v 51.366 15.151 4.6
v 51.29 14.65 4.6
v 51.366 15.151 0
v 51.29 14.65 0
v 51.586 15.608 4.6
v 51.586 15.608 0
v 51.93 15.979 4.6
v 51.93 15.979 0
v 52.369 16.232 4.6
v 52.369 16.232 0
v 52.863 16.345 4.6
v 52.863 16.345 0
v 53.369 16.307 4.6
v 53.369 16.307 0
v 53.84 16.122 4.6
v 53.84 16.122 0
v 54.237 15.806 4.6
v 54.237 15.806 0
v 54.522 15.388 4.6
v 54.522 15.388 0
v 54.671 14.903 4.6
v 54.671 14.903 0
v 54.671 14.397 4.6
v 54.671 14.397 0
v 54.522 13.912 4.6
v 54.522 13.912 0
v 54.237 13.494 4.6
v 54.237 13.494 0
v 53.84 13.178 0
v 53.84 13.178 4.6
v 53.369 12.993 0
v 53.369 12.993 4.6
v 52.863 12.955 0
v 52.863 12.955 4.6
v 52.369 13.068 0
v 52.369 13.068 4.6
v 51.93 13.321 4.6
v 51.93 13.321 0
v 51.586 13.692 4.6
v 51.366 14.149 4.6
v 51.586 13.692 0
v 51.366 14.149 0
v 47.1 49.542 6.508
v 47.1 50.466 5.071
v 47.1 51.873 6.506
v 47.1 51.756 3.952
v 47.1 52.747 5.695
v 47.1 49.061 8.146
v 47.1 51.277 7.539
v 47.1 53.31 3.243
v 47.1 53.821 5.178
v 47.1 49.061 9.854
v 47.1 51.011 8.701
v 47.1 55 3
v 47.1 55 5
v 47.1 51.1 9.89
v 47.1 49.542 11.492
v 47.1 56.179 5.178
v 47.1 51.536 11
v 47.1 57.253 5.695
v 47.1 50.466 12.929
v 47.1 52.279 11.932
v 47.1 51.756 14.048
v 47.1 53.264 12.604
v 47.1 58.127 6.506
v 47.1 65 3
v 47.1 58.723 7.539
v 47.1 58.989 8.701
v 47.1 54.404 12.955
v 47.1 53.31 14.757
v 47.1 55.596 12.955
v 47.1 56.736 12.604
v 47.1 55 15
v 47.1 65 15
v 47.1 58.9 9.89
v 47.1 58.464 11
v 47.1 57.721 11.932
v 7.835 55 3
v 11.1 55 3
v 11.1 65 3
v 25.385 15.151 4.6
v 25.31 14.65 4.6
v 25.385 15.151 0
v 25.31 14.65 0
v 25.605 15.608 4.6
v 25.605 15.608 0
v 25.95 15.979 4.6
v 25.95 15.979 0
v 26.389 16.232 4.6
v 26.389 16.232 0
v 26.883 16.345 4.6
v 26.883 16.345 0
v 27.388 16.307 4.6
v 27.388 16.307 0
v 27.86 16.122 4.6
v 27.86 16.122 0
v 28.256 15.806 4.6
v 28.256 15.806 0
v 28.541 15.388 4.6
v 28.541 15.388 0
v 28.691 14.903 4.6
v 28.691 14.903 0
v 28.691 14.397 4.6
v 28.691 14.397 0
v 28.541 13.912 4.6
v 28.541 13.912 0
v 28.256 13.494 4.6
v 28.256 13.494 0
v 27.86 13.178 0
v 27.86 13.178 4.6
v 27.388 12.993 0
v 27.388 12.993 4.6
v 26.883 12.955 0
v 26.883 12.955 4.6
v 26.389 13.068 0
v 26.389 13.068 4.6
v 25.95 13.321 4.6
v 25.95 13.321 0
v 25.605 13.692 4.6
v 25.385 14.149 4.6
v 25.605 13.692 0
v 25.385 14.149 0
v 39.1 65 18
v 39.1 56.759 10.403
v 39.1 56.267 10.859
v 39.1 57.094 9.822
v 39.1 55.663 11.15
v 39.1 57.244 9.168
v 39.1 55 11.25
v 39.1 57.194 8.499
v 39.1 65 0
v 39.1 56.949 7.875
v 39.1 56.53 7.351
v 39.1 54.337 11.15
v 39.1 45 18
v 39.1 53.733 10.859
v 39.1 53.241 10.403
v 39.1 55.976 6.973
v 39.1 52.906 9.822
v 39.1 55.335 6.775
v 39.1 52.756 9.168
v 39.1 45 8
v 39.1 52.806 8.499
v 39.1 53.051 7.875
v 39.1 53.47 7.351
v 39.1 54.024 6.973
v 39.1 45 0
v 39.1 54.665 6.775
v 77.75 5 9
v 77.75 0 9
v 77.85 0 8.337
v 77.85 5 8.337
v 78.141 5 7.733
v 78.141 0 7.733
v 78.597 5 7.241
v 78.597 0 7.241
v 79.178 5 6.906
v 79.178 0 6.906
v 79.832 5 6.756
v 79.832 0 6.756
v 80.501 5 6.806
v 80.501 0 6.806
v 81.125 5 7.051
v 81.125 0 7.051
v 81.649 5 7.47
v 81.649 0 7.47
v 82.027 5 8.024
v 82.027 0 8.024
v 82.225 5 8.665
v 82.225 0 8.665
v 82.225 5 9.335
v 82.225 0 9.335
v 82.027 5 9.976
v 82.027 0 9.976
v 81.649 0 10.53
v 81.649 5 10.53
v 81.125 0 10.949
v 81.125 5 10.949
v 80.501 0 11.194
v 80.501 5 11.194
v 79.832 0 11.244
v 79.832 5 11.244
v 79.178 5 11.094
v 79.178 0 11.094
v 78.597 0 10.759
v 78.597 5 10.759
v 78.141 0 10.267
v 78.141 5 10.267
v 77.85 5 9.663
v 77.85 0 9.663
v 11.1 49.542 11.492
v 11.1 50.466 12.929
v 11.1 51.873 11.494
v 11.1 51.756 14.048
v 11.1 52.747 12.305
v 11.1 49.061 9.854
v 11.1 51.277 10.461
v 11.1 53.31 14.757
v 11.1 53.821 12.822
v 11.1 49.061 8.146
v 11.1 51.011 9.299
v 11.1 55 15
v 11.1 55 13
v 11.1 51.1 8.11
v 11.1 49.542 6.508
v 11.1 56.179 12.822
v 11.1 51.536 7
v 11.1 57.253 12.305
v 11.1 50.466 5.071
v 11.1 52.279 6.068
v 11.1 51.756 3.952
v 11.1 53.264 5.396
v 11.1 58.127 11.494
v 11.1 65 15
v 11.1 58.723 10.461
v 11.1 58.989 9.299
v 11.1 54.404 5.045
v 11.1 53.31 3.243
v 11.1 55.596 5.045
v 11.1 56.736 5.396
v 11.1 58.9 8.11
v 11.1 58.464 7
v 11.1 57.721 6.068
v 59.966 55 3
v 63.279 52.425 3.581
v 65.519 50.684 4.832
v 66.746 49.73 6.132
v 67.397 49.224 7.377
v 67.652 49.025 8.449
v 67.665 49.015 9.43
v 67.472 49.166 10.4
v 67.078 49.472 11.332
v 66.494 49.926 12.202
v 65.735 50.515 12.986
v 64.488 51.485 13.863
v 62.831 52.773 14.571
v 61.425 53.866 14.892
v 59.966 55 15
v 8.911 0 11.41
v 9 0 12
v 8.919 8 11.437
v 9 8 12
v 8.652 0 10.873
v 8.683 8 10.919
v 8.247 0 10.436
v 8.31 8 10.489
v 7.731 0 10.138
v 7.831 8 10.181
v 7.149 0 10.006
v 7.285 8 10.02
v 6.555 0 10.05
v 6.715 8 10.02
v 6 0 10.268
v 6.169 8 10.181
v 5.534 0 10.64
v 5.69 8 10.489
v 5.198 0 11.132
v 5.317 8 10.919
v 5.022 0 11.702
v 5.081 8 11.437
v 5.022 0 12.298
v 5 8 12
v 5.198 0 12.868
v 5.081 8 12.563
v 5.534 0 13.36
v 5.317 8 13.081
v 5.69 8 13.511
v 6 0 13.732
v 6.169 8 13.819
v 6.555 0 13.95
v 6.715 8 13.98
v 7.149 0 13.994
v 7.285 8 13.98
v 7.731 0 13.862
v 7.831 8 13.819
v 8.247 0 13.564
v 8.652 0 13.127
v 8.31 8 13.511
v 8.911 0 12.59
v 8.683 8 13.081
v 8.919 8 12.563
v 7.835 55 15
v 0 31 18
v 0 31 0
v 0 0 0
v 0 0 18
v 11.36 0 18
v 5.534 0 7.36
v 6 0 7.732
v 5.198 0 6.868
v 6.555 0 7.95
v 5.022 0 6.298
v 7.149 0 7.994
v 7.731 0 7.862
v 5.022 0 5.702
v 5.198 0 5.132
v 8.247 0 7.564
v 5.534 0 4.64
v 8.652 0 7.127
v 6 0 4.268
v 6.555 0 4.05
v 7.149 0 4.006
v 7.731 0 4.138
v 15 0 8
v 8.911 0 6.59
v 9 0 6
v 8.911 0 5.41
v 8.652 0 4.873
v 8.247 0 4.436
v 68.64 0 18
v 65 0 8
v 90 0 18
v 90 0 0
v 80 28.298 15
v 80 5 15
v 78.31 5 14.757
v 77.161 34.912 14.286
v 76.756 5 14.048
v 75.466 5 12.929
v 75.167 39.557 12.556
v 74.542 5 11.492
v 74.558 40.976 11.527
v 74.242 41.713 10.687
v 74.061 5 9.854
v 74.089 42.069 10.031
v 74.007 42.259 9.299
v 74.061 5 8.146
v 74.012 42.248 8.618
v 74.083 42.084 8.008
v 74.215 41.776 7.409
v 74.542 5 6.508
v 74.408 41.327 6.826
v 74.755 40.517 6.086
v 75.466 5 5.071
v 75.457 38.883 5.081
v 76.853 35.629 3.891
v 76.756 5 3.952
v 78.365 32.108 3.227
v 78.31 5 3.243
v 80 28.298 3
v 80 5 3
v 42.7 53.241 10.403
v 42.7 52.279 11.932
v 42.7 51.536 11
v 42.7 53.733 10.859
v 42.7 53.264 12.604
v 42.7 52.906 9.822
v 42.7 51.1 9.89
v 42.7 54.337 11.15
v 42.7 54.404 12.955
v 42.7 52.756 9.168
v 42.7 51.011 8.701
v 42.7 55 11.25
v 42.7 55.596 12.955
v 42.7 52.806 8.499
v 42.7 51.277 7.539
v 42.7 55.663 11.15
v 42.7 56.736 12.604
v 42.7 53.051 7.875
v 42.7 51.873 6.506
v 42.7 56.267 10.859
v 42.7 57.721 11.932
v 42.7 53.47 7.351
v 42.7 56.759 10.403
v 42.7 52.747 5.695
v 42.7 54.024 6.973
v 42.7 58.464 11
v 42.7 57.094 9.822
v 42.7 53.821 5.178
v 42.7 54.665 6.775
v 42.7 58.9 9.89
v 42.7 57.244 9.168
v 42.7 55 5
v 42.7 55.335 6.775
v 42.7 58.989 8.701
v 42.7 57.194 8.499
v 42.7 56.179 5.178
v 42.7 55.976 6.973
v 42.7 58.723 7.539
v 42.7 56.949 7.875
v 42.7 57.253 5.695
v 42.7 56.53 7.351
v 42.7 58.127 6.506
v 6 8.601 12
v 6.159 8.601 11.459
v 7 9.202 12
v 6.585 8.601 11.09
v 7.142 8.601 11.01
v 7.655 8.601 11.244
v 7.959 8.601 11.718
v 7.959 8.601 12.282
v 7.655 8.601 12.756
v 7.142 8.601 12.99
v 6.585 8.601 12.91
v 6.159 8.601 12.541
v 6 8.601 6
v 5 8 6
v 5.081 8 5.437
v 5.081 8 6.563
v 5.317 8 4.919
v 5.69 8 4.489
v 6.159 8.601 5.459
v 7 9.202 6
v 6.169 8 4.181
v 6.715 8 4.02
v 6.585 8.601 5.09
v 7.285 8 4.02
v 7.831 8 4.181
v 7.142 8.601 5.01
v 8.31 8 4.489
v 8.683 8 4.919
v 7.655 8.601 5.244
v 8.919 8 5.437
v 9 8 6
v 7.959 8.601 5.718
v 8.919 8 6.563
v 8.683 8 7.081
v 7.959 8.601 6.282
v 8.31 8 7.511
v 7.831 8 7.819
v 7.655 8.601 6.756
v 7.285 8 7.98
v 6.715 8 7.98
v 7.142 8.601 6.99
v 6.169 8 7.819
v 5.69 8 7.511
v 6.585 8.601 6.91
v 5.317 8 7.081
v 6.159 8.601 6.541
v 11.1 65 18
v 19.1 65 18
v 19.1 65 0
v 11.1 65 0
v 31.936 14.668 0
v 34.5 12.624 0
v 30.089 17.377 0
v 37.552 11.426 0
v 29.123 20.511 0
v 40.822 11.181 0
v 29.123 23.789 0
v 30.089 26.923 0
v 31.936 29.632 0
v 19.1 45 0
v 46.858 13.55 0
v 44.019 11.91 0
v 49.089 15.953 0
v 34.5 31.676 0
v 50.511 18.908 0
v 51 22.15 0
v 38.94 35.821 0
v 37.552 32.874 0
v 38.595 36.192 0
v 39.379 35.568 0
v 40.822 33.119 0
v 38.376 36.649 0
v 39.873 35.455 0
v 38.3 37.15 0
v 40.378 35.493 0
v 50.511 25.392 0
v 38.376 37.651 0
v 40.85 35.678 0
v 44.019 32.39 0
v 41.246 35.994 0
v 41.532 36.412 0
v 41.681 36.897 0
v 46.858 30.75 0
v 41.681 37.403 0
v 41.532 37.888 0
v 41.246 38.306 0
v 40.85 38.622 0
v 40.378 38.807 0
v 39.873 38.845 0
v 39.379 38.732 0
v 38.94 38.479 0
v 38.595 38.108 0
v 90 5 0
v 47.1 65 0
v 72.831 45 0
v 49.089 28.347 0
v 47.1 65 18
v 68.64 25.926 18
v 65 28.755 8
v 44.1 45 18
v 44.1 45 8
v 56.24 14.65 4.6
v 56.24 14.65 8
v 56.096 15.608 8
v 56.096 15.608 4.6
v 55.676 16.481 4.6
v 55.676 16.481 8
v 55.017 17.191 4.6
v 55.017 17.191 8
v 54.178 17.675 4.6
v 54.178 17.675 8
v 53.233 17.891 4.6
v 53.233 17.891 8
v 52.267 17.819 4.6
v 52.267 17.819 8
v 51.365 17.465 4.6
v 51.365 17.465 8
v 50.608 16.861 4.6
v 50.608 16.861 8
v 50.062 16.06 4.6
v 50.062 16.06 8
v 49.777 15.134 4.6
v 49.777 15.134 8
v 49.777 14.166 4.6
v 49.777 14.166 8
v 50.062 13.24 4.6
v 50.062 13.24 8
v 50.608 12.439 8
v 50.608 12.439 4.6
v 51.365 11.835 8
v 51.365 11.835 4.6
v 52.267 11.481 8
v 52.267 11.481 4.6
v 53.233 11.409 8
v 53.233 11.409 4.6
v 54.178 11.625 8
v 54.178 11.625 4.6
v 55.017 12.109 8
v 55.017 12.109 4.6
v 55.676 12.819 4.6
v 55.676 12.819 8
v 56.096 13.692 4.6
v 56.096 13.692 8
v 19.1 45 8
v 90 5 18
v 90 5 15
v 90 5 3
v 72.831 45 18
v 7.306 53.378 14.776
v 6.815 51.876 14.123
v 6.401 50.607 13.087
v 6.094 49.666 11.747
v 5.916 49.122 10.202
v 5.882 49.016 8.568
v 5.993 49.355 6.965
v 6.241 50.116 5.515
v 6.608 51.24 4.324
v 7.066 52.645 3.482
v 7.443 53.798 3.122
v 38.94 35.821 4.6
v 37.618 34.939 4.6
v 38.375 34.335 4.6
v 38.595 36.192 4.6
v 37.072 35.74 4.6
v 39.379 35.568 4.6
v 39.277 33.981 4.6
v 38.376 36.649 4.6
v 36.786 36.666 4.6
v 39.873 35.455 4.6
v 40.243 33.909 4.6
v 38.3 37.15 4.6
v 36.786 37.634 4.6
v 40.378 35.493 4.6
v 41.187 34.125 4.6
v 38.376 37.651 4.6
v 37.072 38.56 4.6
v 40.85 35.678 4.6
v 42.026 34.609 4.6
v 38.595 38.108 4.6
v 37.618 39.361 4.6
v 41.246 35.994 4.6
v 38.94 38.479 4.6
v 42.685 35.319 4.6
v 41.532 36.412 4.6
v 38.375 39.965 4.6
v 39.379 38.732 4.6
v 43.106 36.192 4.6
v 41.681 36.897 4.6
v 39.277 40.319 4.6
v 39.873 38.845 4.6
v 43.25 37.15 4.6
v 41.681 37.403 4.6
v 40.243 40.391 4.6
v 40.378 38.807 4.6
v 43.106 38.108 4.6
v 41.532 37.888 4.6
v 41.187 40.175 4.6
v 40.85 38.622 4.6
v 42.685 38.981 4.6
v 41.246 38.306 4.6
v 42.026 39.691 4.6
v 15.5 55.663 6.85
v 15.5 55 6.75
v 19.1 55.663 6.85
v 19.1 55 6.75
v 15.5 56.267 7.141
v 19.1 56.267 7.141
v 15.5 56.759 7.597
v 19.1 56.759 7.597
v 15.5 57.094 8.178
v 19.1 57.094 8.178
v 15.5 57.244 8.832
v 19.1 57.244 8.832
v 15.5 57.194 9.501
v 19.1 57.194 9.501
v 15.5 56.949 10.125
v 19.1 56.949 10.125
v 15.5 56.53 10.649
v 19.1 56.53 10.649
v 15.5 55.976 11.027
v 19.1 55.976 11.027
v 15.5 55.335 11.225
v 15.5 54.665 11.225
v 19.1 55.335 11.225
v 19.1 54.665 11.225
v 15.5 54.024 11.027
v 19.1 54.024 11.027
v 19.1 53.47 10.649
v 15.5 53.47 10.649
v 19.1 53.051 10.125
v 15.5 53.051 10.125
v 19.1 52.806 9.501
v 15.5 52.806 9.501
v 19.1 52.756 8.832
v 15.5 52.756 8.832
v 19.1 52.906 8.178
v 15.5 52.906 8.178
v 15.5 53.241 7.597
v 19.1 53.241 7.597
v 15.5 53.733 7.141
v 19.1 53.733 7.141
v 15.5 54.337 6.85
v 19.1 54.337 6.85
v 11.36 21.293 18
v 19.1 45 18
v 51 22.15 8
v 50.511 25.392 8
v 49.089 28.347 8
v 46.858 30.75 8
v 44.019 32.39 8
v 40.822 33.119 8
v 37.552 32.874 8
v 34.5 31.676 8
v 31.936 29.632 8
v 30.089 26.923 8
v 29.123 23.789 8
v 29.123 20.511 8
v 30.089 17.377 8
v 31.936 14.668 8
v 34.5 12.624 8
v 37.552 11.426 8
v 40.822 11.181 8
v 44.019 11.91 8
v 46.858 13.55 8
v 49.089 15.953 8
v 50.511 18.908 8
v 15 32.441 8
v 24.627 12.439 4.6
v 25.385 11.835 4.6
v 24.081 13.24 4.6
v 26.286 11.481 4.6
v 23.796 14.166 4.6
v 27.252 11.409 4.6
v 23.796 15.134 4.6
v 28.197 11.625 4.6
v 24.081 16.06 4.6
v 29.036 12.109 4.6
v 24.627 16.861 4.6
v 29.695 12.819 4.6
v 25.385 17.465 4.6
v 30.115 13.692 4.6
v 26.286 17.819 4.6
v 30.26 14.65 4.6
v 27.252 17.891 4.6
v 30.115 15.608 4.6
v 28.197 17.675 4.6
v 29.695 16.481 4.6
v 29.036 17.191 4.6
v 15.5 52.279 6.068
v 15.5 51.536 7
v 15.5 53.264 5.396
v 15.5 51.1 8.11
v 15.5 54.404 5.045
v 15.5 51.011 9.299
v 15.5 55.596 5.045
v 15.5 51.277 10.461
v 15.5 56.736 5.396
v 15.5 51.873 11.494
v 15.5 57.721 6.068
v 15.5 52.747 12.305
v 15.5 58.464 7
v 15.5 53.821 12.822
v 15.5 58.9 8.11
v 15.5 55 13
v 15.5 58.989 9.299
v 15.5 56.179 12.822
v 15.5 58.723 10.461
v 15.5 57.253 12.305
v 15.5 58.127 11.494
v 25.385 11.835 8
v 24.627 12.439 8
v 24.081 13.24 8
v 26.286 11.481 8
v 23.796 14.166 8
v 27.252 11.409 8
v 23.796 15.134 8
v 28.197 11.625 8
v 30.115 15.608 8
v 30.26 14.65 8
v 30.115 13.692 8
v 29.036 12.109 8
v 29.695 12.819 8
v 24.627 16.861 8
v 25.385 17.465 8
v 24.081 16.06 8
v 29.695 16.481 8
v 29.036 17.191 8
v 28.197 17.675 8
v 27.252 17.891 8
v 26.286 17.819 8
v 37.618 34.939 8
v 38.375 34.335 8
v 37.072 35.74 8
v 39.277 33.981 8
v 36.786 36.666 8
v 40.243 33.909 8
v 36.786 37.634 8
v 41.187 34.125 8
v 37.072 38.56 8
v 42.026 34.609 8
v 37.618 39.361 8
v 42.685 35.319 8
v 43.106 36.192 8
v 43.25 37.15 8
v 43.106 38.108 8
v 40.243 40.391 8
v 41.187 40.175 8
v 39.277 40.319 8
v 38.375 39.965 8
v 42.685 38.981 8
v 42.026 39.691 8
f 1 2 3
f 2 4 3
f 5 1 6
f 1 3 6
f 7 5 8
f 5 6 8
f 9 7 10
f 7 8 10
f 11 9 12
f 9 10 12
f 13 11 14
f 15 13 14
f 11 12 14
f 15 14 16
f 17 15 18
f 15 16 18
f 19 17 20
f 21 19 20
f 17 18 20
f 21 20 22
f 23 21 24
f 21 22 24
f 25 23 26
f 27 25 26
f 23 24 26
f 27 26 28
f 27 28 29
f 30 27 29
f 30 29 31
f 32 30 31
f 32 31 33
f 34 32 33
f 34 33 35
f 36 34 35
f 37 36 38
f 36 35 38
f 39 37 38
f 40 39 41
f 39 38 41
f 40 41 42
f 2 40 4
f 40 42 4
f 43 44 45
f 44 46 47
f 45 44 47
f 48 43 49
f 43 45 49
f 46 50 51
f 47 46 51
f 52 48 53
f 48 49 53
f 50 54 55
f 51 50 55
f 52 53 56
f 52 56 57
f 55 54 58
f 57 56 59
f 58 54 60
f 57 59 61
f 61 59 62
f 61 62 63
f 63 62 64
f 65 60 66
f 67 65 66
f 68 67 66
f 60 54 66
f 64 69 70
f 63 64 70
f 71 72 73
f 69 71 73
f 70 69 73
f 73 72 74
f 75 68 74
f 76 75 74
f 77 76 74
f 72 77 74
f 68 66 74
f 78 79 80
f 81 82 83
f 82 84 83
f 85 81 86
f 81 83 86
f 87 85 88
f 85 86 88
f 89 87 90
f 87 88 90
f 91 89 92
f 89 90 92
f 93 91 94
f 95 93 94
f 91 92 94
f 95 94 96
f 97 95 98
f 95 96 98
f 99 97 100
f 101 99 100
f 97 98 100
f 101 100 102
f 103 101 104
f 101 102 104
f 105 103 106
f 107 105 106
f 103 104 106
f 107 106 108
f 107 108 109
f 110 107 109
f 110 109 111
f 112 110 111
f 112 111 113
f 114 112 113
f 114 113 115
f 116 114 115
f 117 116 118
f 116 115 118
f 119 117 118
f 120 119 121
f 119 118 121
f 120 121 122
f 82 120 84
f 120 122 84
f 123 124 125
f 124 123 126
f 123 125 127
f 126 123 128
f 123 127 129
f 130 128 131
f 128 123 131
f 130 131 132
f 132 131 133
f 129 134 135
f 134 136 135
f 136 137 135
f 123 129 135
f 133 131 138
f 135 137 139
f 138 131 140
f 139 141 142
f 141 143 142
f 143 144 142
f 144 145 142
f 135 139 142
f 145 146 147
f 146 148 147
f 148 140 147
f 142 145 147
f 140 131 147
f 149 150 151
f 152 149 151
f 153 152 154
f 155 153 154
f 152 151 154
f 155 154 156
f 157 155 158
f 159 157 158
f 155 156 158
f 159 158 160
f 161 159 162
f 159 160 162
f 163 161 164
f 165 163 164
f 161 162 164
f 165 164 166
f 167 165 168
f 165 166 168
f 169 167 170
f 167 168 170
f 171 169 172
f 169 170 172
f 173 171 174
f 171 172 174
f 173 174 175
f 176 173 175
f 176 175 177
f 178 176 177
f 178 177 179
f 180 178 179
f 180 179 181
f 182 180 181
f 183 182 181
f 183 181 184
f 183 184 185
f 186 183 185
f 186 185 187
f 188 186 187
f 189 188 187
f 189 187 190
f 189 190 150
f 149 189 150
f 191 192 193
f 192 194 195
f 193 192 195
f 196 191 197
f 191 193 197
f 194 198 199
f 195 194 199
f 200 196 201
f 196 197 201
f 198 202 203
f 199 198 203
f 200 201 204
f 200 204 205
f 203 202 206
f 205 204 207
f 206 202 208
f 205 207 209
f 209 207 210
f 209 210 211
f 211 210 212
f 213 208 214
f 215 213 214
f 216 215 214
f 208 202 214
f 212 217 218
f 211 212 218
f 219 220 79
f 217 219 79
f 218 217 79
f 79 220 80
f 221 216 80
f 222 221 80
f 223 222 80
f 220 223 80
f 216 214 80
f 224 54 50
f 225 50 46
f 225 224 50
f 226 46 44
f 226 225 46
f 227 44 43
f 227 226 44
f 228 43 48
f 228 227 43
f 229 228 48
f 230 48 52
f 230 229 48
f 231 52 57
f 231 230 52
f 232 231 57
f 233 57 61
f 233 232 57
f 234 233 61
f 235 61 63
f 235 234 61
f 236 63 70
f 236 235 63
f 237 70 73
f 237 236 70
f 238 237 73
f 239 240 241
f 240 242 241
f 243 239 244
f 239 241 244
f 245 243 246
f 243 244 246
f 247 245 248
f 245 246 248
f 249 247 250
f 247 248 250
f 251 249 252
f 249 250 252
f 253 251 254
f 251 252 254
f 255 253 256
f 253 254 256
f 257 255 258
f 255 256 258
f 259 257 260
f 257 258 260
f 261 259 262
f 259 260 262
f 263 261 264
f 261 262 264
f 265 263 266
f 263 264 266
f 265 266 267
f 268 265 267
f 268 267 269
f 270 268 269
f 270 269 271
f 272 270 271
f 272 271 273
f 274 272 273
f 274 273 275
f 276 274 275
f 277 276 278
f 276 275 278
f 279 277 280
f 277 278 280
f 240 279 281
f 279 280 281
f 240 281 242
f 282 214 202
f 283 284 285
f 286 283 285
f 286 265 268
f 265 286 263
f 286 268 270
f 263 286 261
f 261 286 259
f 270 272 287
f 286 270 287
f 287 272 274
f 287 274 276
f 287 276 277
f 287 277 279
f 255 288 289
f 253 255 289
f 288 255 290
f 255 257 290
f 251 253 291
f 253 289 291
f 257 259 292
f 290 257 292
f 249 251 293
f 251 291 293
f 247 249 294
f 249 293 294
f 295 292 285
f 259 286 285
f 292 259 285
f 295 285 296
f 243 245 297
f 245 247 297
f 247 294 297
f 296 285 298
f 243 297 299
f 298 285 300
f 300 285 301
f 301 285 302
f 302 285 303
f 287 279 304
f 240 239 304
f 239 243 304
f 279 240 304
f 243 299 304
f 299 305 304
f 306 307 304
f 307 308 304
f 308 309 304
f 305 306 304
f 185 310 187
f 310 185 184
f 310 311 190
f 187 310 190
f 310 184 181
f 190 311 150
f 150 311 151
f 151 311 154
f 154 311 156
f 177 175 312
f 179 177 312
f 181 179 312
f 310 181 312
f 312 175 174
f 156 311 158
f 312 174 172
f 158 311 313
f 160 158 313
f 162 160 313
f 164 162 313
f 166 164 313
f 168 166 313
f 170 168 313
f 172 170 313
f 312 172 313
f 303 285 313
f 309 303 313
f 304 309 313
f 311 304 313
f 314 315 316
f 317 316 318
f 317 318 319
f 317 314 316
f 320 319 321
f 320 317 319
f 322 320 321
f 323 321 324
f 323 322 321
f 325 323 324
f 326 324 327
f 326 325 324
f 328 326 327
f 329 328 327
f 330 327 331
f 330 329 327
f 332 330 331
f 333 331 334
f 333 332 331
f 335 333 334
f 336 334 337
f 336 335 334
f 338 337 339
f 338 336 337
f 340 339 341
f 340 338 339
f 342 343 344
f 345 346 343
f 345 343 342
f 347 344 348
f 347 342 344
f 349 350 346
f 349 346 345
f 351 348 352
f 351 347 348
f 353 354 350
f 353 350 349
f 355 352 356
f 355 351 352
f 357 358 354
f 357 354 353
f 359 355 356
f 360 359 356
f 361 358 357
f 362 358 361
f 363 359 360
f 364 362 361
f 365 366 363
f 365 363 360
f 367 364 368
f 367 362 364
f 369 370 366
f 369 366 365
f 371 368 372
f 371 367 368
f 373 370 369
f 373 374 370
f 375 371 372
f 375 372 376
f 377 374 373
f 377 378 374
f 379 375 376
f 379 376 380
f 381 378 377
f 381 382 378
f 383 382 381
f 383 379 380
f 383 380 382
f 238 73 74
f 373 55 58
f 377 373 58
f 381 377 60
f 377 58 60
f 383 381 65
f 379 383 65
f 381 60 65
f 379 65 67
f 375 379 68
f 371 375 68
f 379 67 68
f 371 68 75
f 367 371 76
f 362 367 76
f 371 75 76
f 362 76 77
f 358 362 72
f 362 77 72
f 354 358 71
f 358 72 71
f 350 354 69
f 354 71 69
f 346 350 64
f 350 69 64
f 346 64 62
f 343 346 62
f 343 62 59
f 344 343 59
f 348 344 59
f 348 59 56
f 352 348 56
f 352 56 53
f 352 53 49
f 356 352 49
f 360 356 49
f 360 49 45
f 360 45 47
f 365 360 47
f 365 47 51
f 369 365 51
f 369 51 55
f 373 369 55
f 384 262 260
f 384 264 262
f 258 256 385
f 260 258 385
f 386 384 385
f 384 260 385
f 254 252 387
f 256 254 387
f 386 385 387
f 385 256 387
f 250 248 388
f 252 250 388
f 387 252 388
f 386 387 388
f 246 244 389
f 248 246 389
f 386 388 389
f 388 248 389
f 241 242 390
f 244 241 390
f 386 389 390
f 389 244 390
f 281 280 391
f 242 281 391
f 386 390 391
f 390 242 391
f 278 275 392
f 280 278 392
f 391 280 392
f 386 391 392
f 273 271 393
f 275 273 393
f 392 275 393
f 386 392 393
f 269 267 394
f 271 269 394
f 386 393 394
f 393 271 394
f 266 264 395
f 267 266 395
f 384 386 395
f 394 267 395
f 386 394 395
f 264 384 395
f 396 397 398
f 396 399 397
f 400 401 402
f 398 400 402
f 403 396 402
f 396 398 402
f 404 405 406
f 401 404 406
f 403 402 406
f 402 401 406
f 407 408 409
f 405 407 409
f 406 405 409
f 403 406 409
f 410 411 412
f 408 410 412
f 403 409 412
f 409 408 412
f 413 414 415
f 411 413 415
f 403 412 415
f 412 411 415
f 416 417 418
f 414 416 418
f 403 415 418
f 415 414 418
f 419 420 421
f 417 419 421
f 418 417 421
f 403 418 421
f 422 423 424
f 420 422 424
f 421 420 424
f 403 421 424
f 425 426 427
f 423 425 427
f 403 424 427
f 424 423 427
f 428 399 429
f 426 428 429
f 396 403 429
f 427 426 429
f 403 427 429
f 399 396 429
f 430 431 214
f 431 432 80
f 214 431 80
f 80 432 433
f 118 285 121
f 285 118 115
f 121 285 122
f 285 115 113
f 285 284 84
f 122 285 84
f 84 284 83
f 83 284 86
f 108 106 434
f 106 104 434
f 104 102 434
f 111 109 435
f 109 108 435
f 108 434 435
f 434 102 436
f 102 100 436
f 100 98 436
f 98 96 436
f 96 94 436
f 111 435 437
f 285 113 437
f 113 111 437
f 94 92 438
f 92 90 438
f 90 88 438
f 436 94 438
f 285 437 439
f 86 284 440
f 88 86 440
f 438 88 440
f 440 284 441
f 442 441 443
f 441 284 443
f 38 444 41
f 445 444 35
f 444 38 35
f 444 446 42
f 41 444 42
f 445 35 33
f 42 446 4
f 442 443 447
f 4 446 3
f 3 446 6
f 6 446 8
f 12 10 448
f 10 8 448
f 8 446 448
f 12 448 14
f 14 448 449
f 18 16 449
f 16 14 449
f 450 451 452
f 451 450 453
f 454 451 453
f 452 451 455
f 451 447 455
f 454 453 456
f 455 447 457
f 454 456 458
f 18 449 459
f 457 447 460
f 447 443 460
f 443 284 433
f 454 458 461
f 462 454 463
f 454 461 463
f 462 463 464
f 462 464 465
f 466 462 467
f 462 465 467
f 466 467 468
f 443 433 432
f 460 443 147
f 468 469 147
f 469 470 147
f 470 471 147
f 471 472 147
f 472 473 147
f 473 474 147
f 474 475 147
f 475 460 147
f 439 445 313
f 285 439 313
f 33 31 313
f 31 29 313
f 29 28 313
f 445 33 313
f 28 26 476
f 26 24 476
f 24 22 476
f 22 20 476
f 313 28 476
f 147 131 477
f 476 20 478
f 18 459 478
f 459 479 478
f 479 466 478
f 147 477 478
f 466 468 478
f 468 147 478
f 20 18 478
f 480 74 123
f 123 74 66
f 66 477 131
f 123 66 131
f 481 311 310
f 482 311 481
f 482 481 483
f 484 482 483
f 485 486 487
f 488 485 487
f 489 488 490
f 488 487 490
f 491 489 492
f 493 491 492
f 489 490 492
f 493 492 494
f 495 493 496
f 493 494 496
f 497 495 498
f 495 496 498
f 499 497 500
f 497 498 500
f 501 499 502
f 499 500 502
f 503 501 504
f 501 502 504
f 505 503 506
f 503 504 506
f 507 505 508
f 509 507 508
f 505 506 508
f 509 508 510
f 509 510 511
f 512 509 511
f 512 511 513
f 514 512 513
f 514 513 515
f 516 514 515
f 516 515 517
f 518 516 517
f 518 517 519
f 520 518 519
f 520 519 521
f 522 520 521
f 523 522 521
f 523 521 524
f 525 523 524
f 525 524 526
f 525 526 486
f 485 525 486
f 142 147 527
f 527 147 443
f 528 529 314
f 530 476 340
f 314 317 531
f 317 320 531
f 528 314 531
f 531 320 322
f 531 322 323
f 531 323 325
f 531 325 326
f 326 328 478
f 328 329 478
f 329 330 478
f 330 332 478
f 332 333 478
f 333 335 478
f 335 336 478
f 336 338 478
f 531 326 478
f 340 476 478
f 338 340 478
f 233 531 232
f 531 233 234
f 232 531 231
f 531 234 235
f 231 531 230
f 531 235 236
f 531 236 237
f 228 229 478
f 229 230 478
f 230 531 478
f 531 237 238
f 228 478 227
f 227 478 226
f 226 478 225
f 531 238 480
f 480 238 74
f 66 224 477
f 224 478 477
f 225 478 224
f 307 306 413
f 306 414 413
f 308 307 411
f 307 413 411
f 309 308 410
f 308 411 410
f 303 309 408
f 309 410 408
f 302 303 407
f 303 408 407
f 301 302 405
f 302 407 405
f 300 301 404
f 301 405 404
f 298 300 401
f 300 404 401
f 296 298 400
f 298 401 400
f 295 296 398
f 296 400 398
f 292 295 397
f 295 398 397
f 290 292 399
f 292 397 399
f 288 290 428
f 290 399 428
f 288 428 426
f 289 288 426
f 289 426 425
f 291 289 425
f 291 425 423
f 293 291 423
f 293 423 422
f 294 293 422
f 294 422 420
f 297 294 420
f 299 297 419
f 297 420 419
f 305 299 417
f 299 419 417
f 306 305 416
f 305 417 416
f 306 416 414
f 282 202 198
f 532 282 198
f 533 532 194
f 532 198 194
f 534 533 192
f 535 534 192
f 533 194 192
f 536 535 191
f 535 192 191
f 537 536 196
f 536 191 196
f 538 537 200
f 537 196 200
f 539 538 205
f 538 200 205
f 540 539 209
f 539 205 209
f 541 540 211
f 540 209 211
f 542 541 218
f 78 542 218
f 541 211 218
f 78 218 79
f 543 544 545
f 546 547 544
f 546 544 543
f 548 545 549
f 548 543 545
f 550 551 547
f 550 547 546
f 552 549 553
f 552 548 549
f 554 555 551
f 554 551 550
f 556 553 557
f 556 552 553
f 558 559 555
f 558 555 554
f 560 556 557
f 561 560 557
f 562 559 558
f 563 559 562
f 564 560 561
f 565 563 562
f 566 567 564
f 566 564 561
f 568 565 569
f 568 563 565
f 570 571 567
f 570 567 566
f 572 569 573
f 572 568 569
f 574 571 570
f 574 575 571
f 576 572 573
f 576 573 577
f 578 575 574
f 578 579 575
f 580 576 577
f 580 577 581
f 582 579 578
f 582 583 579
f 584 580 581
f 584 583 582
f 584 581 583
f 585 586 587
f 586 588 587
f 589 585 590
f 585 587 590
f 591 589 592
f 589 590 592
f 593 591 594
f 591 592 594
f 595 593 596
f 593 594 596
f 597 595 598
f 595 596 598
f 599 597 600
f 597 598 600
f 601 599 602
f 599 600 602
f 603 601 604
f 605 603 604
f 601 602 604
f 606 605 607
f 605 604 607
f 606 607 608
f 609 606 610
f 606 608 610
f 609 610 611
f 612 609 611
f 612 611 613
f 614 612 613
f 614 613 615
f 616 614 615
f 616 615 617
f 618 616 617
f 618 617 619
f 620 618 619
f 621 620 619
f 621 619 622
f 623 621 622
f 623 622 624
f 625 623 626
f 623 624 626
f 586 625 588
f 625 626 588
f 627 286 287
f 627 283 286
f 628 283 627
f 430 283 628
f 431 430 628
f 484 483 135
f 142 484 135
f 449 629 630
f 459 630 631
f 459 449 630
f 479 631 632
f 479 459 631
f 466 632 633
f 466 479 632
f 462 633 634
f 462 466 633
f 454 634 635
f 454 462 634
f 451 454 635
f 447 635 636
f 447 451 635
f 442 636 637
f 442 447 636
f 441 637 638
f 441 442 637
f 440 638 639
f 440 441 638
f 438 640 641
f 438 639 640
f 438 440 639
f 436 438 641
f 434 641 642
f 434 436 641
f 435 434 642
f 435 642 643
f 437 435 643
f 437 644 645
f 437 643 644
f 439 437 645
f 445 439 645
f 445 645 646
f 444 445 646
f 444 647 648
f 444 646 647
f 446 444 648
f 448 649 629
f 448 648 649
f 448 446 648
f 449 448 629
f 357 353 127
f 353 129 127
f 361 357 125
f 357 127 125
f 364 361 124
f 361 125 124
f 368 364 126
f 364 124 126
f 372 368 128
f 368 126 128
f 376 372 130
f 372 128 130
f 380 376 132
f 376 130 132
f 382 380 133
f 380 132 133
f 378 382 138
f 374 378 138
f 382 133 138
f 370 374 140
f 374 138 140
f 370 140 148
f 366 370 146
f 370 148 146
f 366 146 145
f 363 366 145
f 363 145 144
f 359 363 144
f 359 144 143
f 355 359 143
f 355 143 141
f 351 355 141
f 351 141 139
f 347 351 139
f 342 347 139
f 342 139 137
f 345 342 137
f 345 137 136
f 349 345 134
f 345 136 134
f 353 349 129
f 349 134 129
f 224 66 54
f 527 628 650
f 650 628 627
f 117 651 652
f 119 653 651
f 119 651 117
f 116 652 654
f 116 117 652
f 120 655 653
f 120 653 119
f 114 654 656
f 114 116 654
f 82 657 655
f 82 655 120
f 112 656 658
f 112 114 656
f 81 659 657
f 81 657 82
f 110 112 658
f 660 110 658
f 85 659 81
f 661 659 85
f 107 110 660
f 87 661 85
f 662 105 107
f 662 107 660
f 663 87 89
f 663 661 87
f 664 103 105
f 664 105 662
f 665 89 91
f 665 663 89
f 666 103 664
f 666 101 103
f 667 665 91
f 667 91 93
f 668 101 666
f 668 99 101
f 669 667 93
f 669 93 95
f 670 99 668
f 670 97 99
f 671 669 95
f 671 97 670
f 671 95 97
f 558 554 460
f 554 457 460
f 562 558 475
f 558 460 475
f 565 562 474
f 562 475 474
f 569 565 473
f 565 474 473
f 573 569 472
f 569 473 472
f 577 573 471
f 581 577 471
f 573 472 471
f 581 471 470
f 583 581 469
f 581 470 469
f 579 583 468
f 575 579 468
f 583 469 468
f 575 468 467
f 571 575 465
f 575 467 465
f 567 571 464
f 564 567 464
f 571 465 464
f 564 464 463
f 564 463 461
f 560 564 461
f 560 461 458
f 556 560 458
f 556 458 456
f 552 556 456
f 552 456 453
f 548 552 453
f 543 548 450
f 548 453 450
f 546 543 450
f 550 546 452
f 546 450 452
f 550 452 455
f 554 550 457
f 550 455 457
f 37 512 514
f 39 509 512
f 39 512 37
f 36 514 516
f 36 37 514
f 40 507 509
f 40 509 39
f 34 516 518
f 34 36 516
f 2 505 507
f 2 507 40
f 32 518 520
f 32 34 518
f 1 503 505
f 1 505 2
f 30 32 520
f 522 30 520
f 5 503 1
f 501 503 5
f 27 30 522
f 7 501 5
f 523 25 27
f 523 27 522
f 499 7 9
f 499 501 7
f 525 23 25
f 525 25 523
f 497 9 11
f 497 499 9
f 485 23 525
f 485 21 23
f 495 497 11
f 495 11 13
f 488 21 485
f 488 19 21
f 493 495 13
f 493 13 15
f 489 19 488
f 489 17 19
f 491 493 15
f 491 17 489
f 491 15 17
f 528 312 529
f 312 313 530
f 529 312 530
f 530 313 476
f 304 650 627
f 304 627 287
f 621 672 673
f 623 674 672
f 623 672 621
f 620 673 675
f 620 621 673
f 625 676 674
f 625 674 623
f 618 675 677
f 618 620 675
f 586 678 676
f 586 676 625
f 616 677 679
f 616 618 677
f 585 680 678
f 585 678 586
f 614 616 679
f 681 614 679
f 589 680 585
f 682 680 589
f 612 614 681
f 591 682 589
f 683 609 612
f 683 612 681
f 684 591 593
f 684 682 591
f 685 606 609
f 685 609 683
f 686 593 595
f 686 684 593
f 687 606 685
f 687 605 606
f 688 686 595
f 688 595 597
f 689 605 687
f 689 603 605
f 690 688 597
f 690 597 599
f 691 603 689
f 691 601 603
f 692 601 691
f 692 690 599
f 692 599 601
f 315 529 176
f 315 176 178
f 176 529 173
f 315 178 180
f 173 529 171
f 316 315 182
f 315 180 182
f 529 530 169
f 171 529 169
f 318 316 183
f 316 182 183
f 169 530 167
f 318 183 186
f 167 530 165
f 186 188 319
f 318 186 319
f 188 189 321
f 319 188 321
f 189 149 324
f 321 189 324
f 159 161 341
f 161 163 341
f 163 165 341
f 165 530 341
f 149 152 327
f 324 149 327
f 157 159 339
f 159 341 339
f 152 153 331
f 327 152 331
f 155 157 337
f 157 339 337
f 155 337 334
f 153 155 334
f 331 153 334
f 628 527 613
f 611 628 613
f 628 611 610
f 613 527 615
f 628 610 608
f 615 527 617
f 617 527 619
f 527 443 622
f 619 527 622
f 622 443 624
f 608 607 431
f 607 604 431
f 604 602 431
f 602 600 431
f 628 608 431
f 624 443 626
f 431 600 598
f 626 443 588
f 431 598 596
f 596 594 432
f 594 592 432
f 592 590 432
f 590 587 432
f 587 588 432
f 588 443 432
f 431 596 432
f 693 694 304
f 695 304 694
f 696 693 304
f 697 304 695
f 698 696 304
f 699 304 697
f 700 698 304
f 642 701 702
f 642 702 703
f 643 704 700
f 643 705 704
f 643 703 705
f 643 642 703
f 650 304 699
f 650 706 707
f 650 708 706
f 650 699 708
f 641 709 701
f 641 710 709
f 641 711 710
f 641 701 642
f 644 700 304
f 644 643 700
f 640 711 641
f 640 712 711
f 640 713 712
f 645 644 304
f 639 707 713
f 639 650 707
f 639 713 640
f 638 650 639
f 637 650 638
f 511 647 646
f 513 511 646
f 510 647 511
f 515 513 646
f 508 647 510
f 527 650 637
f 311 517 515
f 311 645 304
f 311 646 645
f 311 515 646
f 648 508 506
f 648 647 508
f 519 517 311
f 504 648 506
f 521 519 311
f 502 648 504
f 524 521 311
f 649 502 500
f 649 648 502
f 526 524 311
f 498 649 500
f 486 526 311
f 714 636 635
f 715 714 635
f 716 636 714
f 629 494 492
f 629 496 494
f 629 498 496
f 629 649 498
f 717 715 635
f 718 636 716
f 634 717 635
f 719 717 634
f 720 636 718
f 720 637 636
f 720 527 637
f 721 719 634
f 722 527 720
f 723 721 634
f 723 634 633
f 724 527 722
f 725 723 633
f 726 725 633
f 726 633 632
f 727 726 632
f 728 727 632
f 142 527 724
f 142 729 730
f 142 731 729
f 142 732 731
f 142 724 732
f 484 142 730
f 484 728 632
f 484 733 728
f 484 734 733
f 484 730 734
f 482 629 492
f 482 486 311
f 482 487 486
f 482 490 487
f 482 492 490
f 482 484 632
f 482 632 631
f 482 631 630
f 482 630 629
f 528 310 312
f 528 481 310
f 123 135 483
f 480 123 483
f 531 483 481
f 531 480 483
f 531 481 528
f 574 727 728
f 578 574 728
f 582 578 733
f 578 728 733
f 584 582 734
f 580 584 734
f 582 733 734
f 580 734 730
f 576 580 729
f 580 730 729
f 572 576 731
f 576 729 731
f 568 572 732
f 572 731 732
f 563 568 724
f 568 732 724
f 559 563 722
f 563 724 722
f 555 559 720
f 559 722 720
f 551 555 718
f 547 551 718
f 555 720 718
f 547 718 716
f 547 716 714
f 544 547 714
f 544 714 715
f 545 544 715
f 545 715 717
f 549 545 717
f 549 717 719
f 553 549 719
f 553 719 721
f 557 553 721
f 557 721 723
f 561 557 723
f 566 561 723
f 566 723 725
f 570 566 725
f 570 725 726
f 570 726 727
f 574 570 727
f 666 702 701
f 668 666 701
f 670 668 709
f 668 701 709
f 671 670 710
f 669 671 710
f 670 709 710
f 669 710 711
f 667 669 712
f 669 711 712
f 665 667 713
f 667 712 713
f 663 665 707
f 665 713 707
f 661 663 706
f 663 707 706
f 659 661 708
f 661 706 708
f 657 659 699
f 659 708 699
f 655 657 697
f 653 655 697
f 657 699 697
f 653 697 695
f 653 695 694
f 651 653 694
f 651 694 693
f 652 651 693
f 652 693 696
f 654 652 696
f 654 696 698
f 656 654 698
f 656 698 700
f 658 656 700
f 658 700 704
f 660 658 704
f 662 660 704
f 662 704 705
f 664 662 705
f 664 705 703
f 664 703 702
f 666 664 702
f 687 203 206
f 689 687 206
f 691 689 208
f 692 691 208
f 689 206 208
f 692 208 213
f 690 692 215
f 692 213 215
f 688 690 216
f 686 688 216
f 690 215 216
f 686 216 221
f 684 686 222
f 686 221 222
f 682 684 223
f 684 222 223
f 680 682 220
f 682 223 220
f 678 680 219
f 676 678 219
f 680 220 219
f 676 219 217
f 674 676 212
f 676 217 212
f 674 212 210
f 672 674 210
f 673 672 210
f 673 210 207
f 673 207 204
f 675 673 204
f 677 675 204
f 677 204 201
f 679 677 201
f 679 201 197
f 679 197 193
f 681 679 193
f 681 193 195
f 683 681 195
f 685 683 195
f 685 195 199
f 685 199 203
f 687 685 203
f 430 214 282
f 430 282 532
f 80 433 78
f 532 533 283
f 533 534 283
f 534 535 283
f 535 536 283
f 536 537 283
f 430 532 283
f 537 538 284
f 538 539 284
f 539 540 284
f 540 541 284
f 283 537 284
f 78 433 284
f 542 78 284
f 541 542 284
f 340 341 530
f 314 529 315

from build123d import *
from OCP.BRepFilletAPI import BRepFilletAPI_MakeChamfer

# Parameters (mm, degrees)
SKETCH1_R                                           = 11
BOSS_EXTRUDE1_DEPTH                                 = 18
CUT_EXTRUDE4_DEPTH                                  = 60
CUT_EXTRUDE5_DEPTH                                  = 10
CHAMFER1_SIZE                                       = 3.639702343
CHAMFER1_SIZE_2                                     = 10
CUT_EXTRUDE6_DEPTH                                  = 42.9
CUT_EXTRUDE7_START                                  = -11.1
CUT_EXTRUDE7_DEPTH                                  = 11.1
CBORE_FOR_M3_HEX_SOCKET_HEAD_CAP_SCREW2_D           = 3.4
CBORE_FOR_M3_HEX_SOCKET_HEAD_CAP_SCREW2_DEPTH       = 8
CBORE_FOR_M3_HEX_SOCKET_HEAD_CAP_SCREW2_CBORE_D     = 6.5
CBORE_FOR_M3_HEX_SOCKET_HEAD_CAP_SCREW2_CBORE_DEPTH = 3.4
CBORE_FOR_M3_HEX_SOCKET_HEAD_CAP_SCREW2_TIP         = 1.021463052
CBORE_FOR_M4_HEX_SOCKET_HEAD_CAP_SCREW1_D           = 4.5
CBORE_FOR_M4_HEX_SOCKET_HEAD_CAP_SCREW1_DEPTH       = 8
CBORE_FOR_M4_HEX_SOCKET_HEAD_CAP_SCREW1_CBORE_D     = 8
CBORE_FOR_M4_HEX_SOCKET_HEAD_CAP_SCREW1_CBORE_DEPTH = 4.4
CBORE_FOR_M4_HEX_SOCKET_HEAD_CAP_SCREW1_TIP         = 1.351936393
CBORE_FOR_M4_HEX_SOCKET_HEAD_CAP_SCREW2_D           = 4.5
CBORE_FOR_M4_HEX_SOCKET_HEAD_CAP_SCREW2_DEPTH       = 8
CBORE_FOR_M4_HEX_SOCKET_HEAD_CAP_SCREW2_CBORE_D     = 8
CBORE_FOR_M4_HEX_SOCKET_HEAD_CAP_SCREW2_CBORE_DEPTH = 4.4
CBORE_FOR_M4_HEX_SOCKET_HEAD_CAP_SCREW2_TIP         = 1.351936393
M4_CLEARANCE_HOLE1_D                                = 4.5
M4_CLEARANCE_HOLE1_DEPTH                            = 8
M4_CLEARANCE_HOLE1_TIP                              = 1.351936393
F_4_0MM_DOWEL_HOLE1_D                               = 4
F_4_0MM_DOWEL_HOLE1_DEPTH                           = 8
F_4_0MM_DOWEL_HOLE1_TIP                             = 1.201721238


with BuildPart() as part:
    # Sketch1 → Boss-Extrude1 (new body)
    with BuildSketch(Plane.XY):
        Polygon((39.1, 65), (39.1, 45), (19.1, 45), (19.1, 65), (11.1, 65), (0, 31), (0, 0), (90, 0), (90, 5), (72.831044759, 45), (47.1, 65), align=None)
        with Locations((40, 22.15)):
            Circle(SKETCH1_R, mode=Mode.SUBTRACT)
    extrude(amount=BOSS_EXTRUDE1_DEPTH)

    # Sketch5 → Cut-Extrude4 (cut)
    with BuildSketch(Plane(origin=(0, 65, 0), x_dir=(1, 0, 0), z_dir=(0, 1, 0))):
        with BuildLine():
            Line((90, -15), (80, -15))
            ThreePointArc((80, -15), (74, -9), (80, -3))
            Line((80, -3), (90, -3))
            ThreePointArc((90, -3), (96, -9), (90, -15))
        make_face()
    extrude(amount=-CUT_EXTRUDE4_DEPTH, mode=Mode.SUBTRACT)

    # Sketch6 → Cut-Extrude5 (cut)
    with BuildSketch(Plane.XY.offset(18)):
        Polygon((19.1, 45), (15, 32.441441441), (15, 0), (65, 0), (65, 28.75503195), (44.1, 45), align=None)
    extrude(amount=-CUT_EXTRUDE5_DEPTH, mode=Mode.SUBTRACT)

    # Chamfer1
    chamfer1_edges_1 = [part.edges().sort_by_distance(p)[0] for p in [
        (15, 16.220720721, 18),
    ]]
    chamfer1_side_1 = [part.faces().sort_by_distance(p)[0] for p in [
        (14.927205953, 16.220720721, 18),
    ]]
    chamfer1_edges_2 = [part.edges().sort_by_distance(p)[0] for p in [
        (65, 14.377515975, 18),
    ]]
    chamfer1_side_2 = [part.faces().sort_by_distance(p)[0] for p in [
        (65.072794047, 14.377515975, 18),
    ]]
    chamfer1 = BRepFilletAPI_MakeChamfer(part.part.solid().wrapped)
    for e in chamfer1_edges_1:
        chamfer1.Add(CHAMFER1_SIZE - 0.0001, CHAMFER1_SIZE_2 - 0.0001, e.wrapped, chamfer1_side_1[0].wrapped)
    for e in chamfer1_edges_2:
        chamfer1.Add(CHAMFER1_SIZE - 0.0001, CHAMFER1_SIZE_2 - 0.0001, e.wrapped, chamfer1_side_2[0].wrapped)
    add(Compound.cast(chamfer1.Shape()), mode=Mode.REPLACE)  # a hair under: the kernel refuses the full size

    # Sketch7 → Cut-Extrude6 (cut)
    with BuildSketch(Plane(origin=(90, 0, 0), x_dir=(0, 0, -1), z_dir=(1, 0, 0))):
        with BuildLine():
            Line((-3, 65), (-3, 55))
            ThreePointArc((-3, 55), (-9, 49), (-15, 55))
            Line((-15, 55), (-15, 65))
            ThreePointArc((-15, 65), (-9, 71), (-3, 65))
        make_face()
    extrude(amount=-CUT_EXTRUDE6_DEPTH, mode=Mode.SUBTRACT)

    # Sketch8 → Cut-Extrude7 (cut)
    with BuildSketch(Plane.ZY.offset(CUT_EXTRUDE7_START)):
        with BuildLine():
            Line((15, 65), (15, 55))
            ThreePointArc((15, 55), (9, 49), (3, 55))
            Line((3, 55), (3, 65))
            ThreePointArc((3, 65), (9, 71), (15, 65))
        make_face()
    extrude(amount=CUT_EXTRUDE7_DEPTH, mode=Mode.SUBTRACT)

    # CBORE for M3 Hex Socket Head Cap Screw2
    with Locations(Plane.XY.offset(8)):
        with Locations((40, 37.15), (52.990381057, 14.65), (27.009618943, 14.65)):
            CounterBoreHole(CBORE_FOR_M3_HEX_SOCKET_HEAD_CAP_SCREW2_D / 2, CBORE_FOR_M3_HEX_SOCKET_HEAD_CAP_SCREW2_CBORE_D / 2, CBORE_FOR_M3_HEX_SOCKET_HEAD_CAP_SCREW2_CBORE_DEPTH, depth=CBORE_FOR_M3_HEX_SOCKET_HEAD_CAP_SCREW2_DEPTH)
            with Locations((0, 0, -(CBORE_FOR_M3_HEX_SOCKET_HEAD_CAP_SCREW2_DEPTH + CBORE_FOR_M3_HEX_SOCKET_HEAD_CAP_SCREW2_TIP / 2))):  # 118° drill point
                Cone(0, CBORE_FOR_M3_HEX_SOCKET_HEAD_CAP_SCREW2_D / 2, CBORE_FOR_M3_HEX_SOCKET_HEAD_CAP_SCREW2_TIP, mode=Mode.SUBTRACT)

    # CBORE for M4 Hex Socket Head Cap Screw1
    with Locations(Plane(origin=(47.1, 0, 0), x_dir=(0, 0, -1), z_dir=(1, 0, 0))):
        with Locations((-9, 55)):
            CounterBoreHole(CBORE_FOR_M4_HEX_SOCKET_HEAD_CAP_SCREW1_D / 2, CBORE_FOR_M4_HEX_SOCKET_HEAD_CAP_SCREW1_CBORE_D / 2, CBORE_FOR_M4_HEX_SOCKET_HEAD_CAP_SCREW1_CBORE_DEPTH, depth=CBORE_FOR_M4_HEX_SOCKET_HEAD_CAP_SCREW1_DEPTH)
            with Locations((0, 0, -(CBORE_FOR_M4_HEX_SOCKET_HEAD_CAP_SCREW1_DEPTH + CBORE_FOR_M4_HEX_SOCKET_HEAD_CAP_SCREW1_TIP / 2))):  # 118° drill point
                Cone(0, CBORE_FOR_M4_HEX_SOCKET_HEAD_CAP_SCREW1_D / 2, CBORE_FOR_M4_HEX_SOCKET_HEAD_CAP_SCREW1_TIP, mode=Mode.SUBTRACT)

    # CBORE for M4 Hex Socket Head Cap Screw2
    with Locations(Plane.ZY.offset(-11.1)):
        with Locations((9, 55)):
            CounterBoreHole(CBORE_FOR_M4_HEX_SOCKET_HEAD_CAP_SCREW2_D / 2, CBORE_FOR_M4_HEX_SOCKET_HEAD_CAP_SCREW2_CBORE_D / 2, CBORE_FOR_M4_HEX_SOCKET_HEAD_CAP_SCREW2_CBORE_DEPTH, depth=CBORE_FOR_M4_HEX_SOCKET_HEAD_CAP_SCREW2_DEPTH)
            with Locations((0, 0, -(CBORE_FOR_M4_HEX_SOCKET_HEAD_CAP_SCREW2_DEPTH + CBORE_FOR_M4_HEX_SOCKET_HEAD_CAP_SCREW2_TIP / 2))):  # 118° drill point
                Cone(0, CBORE_FOR_M4_HEX_SOCKET_HEAD_CAP_SCREW2_D / 2, CBORE_FOR_M4_HEX_SOCKET_HEAD_CAP_SCREW2_TIP, mode=Mode.SUBTRACT)

    # M4 Clearance Hole1
    with Locations(Plane(origin=(0, 5, 0), x_dir=(1, 0, 0), z_dir=(0, 1, 0))):
        with Locations((80, -9)):
            Hole(M4_CLEARANCE_HOLE1_D / 2, depth=M4_CLEARANCE_HOLE1_DEPTH)
            with Locations((0, 0, -(M4_CLEARANCE_HOLE1_DEPTH + M4_CLEARANCE_HOLE1_TIP / 2))):  # 118° drill point
                Cone(0, M4_CLEARANCE_HOLE1_D / 2, M4_CLEARANCE_HOLE1_TIP, mode=Mode.SUBTRACT)

    # Ø4.0mm Dowel Hole1
    with Locations(Plane(origin=(0, 0, 0), x_dir=(-1, 0, 0), z_dir=(0, -1, 0))):
        with Locations((-7, -12), (-7, -6)):
            Hole(F_4_0MM_DOWEL_HOLE1_D / 2, depth=F_4_0MM_DOWEL_HOLE1_DEPTH)
            with Locations((0, 0, -(F_4_0MM_DOWEL_HOLE1_DEPTH + F_4_0MM_DOWEL_HOLE1_TIP / 2))):  # 118° drill point
                Cone(0, F_4_0MM_DOWEL_HOLE1_D / 2, F_4_0MM_DOWEL_HOLE1_TIP, mode=Mode.SUBTRACT)


solid = part.part
